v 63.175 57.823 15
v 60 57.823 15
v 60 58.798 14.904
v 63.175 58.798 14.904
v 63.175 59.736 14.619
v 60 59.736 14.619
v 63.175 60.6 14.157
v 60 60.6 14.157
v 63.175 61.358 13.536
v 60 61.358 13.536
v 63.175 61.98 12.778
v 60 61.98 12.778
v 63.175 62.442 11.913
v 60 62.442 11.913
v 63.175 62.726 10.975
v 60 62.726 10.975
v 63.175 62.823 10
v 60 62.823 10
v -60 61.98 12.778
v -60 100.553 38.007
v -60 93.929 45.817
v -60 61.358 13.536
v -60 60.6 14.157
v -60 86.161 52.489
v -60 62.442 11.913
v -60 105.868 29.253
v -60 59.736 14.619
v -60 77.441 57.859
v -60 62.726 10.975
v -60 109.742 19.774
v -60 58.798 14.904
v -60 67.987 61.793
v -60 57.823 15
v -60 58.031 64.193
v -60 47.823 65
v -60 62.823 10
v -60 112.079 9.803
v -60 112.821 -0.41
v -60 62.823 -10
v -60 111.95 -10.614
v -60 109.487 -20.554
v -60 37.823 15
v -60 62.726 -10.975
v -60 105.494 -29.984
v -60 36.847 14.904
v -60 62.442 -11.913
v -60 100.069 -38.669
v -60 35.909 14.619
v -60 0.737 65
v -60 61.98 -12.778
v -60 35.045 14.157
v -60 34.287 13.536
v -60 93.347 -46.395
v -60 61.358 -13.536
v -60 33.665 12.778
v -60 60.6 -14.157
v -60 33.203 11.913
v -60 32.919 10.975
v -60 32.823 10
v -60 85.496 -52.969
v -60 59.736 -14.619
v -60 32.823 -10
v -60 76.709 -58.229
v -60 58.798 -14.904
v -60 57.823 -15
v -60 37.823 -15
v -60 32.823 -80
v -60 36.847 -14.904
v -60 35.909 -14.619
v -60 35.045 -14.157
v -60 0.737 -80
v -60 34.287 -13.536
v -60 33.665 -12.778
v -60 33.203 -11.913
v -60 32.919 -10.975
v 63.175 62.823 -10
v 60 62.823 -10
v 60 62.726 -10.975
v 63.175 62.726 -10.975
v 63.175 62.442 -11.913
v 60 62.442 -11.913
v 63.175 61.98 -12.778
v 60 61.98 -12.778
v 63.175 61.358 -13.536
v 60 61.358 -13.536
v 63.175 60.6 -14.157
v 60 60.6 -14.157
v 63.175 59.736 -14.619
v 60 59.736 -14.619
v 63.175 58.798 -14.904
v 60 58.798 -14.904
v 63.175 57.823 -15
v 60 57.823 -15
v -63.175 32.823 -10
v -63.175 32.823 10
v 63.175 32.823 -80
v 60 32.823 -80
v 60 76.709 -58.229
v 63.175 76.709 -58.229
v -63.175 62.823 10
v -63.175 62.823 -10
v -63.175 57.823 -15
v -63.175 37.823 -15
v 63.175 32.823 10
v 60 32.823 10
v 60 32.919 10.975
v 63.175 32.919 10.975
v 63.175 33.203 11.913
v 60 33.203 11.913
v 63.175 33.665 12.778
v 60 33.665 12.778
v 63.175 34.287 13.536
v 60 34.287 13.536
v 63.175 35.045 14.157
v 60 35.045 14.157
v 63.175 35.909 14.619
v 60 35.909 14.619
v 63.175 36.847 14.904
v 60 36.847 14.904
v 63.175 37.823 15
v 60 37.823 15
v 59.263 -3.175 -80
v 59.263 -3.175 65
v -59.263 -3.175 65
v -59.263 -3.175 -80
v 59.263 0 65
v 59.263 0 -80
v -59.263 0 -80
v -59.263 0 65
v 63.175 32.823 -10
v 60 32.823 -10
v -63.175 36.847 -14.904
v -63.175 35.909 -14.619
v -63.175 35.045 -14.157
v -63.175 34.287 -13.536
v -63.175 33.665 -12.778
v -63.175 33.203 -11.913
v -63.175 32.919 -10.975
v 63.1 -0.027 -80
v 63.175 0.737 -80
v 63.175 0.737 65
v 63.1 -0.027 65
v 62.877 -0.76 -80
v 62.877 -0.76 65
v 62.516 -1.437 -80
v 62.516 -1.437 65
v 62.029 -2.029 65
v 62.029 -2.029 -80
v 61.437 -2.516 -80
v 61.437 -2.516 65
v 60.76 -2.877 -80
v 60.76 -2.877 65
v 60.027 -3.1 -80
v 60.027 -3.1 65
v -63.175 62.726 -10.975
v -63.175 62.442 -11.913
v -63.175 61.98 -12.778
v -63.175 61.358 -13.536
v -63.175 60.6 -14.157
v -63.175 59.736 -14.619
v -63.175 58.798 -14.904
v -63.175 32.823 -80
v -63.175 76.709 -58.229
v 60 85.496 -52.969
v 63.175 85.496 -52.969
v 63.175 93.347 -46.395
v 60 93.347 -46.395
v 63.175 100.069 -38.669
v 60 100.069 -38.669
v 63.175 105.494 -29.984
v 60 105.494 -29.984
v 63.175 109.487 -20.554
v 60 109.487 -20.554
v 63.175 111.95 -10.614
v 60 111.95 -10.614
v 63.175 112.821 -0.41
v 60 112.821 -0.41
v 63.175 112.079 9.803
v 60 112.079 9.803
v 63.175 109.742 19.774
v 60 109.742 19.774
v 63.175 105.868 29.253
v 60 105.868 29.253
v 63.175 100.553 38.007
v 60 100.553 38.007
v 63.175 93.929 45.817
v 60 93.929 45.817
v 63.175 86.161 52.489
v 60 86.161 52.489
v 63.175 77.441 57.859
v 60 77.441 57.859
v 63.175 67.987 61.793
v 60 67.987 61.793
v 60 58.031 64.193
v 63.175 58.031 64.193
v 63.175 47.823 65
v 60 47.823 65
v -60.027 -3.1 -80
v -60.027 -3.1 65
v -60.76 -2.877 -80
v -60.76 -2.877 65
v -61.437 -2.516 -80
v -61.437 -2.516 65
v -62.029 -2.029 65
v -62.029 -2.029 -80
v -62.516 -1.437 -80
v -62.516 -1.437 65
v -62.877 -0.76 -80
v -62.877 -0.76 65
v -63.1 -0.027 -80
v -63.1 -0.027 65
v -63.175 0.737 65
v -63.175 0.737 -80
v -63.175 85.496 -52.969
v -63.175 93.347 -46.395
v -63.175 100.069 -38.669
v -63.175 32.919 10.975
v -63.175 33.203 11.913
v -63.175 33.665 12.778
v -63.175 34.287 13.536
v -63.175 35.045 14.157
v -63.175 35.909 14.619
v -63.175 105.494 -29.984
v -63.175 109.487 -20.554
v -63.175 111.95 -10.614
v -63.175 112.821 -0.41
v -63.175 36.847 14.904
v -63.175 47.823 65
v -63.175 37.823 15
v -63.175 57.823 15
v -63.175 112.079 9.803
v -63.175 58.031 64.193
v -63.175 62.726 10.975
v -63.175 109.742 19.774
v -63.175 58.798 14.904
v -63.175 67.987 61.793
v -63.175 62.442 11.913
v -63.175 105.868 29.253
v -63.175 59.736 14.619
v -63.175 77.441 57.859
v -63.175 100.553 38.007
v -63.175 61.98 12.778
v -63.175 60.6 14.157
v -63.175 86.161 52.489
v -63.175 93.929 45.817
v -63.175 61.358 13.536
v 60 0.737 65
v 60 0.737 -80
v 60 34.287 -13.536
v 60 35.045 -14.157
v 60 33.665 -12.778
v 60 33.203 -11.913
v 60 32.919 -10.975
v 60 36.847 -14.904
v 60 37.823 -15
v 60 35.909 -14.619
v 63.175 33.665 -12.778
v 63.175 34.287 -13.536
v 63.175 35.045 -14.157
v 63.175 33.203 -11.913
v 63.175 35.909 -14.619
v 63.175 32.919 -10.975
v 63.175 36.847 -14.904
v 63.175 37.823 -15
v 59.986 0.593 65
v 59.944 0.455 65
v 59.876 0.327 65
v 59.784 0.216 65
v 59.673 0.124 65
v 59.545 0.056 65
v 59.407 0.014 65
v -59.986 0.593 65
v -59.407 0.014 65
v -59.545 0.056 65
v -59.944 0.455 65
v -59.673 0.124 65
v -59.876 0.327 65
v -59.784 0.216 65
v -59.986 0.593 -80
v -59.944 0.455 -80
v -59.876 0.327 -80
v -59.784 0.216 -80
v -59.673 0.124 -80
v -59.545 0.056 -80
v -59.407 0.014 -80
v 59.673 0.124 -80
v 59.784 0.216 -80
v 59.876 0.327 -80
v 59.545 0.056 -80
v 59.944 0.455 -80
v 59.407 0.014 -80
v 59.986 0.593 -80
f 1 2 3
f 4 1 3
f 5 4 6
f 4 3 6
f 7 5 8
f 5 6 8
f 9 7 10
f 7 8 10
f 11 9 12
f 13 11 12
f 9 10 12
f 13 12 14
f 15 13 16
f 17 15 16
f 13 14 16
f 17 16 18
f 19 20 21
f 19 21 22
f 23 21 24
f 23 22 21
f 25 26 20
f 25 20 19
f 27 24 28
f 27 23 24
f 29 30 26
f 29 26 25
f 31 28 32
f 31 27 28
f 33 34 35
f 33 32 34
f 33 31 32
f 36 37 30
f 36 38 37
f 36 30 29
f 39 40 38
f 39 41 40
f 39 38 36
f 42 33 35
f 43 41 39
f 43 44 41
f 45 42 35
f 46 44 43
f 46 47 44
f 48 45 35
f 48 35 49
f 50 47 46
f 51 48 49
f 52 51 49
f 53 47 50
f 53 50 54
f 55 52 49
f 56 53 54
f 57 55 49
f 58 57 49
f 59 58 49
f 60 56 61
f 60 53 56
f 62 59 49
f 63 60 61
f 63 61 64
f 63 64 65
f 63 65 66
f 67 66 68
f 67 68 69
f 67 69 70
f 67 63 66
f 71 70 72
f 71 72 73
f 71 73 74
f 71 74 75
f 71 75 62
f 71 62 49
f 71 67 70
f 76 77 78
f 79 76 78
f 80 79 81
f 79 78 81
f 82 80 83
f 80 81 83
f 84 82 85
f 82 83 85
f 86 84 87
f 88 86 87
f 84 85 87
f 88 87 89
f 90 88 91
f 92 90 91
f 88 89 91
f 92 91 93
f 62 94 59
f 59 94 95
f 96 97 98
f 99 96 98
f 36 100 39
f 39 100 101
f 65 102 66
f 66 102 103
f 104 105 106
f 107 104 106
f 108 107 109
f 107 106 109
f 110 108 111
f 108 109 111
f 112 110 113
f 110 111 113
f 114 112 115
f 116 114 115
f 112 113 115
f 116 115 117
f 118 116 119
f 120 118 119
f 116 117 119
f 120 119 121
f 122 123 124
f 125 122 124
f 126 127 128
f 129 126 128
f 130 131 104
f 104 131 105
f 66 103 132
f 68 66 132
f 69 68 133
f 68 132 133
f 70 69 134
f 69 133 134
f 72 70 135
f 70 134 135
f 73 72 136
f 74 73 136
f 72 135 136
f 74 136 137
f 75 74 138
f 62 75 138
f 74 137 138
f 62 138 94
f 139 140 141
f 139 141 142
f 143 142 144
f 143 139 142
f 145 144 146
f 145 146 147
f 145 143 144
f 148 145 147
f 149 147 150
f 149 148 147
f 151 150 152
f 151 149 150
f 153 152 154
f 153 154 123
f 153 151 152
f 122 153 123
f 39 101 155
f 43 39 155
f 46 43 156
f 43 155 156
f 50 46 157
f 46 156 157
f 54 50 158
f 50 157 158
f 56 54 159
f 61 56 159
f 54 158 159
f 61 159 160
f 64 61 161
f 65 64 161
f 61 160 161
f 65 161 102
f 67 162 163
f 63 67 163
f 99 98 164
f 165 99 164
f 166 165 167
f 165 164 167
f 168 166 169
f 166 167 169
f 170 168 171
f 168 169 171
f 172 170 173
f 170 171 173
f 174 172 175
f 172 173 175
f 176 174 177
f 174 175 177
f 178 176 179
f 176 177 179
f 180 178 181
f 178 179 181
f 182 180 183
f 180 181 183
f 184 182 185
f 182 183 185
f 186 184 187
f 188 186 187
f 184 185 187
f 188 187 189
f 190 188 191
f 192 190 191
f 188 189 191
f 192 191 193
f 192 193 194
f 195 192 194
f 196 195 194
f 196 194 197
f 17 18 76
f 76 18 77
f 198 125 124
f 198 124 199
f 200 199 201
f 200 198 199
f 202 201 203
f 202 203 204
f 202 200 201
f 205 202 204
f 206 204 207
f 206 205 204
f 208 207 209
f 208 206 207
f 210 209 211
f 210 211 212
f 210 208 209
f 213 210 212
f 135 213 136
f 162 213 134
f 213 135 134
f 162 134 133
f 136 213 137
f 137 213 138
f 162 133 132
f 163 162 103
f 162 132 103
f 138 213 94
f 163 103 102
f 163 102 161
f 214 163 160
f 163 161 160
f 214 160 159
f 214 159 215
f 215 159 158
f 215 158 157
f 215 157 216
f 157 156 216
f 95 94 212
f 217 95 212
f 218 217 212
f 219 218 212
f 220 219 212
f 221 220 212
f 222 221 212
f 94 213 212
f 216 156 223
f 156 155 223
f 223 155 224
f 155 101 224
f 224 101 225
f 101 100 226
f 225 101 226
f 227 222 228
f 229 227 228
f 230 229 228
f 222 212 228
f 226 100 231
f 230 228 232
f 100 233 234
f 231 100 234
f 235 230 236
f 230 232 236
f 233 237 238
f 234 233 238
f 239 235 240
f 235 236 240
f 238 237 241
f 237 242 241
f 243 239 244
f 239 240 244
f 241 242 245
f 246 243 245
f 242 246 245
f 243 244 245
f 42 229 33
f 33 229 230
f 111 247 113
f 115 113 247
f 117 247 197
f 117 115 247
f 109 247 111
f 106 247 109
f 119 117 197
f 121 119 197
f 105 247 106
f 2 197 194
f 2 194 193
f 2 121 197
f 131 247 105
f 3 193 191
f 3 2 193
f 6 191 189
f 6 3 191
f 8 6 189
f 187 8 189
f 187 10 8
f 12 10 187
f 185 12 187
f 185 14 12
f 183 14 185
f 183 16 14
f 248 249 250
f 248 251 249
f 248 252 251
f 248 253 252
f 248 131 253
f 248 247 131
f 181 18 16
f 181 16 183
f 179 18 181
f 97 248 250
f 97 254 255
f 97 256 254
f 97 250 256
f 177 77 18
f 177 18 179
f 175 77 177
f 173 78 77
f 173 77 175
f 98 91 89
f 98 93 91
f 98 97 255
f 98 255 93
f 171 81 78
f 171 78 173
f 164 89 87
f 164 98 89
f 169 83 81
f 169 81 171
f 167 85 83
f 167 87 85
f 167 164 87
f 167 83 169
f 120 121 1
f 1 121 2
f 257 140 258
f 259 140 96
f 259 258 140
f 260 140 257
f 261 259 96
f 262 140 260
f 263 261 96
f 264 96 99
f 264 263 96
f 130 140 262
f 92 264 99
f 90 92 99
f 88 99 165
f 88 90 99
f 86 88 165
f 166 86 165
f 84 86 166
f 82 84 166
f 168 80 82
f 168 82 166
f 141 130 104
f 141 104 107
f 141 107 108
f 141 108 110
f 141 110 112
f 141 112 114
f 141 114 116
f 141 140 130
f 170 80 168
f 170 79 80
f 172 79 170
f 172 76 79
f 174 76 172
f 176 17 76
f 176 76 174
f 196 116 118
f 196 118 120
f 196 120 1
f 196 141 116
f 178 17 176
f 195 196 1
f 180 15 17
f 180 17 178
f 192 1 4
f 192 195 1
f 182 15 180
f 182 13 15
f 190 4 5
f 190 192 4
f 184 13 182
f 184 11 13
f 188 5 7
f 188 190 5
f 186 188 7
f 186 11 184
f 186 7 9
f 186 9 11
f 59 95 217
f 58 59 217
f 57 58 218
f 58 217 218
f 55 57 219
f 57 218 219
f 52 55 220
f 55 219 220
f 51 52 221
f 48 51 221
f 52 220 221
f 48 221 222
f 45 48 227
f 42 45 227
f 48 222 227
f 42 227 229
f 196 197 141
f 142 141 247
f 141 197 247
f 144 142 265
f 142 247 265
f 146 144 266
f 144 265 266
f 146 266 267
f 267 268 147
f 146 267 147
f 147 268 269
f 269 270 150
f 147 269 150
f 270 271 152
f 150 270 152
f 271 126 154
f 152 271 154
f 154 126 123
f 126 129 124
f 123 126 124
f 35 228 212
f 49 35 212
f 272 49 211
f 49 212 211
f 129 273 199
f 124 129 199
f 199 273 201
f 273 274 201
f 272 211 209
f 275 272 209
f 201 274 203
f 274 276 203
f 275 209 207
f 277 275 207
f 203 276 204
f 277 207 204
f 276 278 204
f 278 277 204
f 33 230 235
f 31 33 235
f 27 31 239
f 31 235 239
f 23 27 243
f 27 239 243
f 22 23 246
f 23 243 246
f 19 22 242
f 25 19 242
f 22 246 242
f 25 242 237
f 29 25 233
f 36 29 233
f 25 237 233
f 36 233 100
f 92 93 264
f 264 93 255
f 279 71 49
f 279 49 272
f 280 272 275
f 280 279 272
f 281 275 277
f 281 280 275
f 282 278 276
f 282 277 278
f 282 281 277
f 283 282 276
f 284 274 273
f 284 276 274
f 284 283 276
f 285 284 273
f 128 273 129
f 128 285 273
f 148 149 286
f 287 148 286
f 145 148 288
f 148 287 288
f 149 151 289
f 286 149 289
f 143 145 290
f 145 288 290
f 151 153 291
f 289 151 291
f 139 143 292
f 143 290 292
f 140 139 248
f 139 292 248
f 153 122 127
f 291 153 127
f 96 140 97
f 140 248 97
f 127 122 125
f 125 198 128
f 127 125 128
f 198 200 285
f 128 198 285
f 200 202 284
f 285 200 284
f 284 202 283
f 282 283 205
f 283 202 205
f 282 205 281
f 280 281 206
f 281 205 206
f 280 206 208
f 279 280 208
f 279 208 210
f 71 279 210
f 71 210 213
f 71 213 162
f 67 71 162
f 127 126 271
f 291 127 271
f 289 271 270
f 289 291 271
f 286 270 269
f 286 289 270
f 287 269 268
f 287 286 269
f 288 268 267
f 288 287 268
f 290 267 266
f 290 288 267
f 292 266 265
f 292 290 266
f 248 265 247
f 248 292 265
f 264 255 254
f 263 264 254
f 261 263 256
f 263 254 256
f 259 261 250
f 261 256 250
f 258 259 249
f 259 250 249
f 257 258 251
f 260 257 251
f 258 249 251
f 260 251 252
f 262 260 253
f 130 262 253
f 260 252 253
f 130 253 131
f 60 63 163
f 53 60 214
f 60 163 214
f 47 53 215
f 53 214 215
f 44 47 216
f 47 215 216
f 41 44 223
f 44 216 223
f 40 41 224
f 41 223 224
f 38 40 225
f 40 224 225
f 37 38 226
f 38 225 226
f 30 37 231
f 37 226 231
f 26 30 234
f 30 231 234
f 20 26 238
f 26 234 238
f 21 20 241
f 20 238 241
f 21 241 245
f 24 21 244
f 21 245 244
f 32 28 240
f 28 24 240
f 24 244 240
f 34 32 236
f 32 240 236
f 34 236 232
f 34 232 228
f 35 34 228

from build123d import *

# Parameters (mm, degrees)
BASE_FLANGE2_DEPTH         = 3.175
SKETCHED_START             = -176
SKETCHED_BEND3_OUTLINE_W   = 3.175
SKETCHED_BEND3_OUTLINE_H   = 145
SKETCHED_BEND3_DEPTH       = 112.825
SKETCHED_START_2           = 63.175
SKETCHED_BEND3_2_OUTLINE_W = 3.175
SKETCHED_BEND3_2_OUTLINE_H = 145
SKETCHED_BEND3_2_DEPTH     = 112.825
SKETCHED_START_3           = -62.794557784
SKETCHED_BEND3_3_DEPTH     = 2.794557784
SKETCHED_START_4           = 60
SKETCHED_BEND3_4_DEPTH     = 2.794557784
SKETCHED_START_5           = -63.175
SKETCHED_BEND3_5_DEPTH     = 3.9116
SKETCHED_START_6           = 59.2634
SKETCHED_BEND3_6_DEPTH     = 3.9116
SKETCHED_START_7           = -81
SKETCHED_BEND3_7_DEPTH     = 147


with BuildPart() as part:
    # Base-Flange2: sheet metal written as solids
    # Sketch1 → Base-Flange2 (new body)
    with BuildSketch(Plane(origin=(0, 0, 0), x_dir=(1, 0, 0), z_dir=(0, 1, 0))):
        with BuildLine():
            Line((-95, 80), (95, 80))
            Line((95, 80), (138.886329547, 58.22868679))
            ThreePointArc((138.886329547, 58.22868679), (173.284534609, -14.834678268), (110, -65))
            Line((110, -65), (-110, -65))
            ThreePointArc((-110, -65), (-173.284534609, -14.834678268), (-138.886329547, 58.22868679))
            Line((-138.886329547, 58.22868679), (-95, 80))
        make_face()
        with BuildLine():
            Line((100, -15), (120, -15))
            ThreePointArc((120, -15), (123.535533906, -13.535533906), (125, -10))
            Line((125, -10), (125, 10))
            ThreePointArc((125, 10), (123.535533906, 13.535533906), (120, 15))
            Line((120, 15), (100, 15))
            ThreePointArc((100, 15), (96.464466094, 13.535533906), (95, 10))
            Line((95, 10), (95, -10))
            ThreePointArc((95, -10), (96.464466094, -13.535533906), (100, -15))
        make_face(mode=Mode.SUBTRACT)
        with BuildLine():
            Line((-100, -15), (-120, -15))
            ThreePointArc((-120, -15), (-123.535533906, -13.535533906), (-125, -10))
            Line((-125, -10), (-125, 10))
            ThreePointArc((-125, 10), (-123.535533906, 13.535533906), (-120, 15))
            Line((-120, 15), (-100, 15))
            ThreePointArc((-100, 15), (-96.464466094, 13.535533906), (-95, 10))
            Line((-95, 10), (-95, -10))
            ThreePointArc((-95, -10), (-96.464466094, -13.535533906), (-100, -15))
        make_face(mode=Mode.SUBTRACT)
    extrude(amount=-BASE_FLANGE2_DEPTH)

    # Sketched Bend3: read off the stored shape, not the designer's step
    # Sketched Bend3 outline → Sketched Bend3 (cut)
    with BuildSketch(Plane.YZ.offset(SKETCHED_START)):
        with Locations((-1.5875, -7.5)):
            Rectangle(SKETCHED_BEND3_OUTLINE_W, SKETCHED_BEND3_OUTLINE_H)
    extrude(amount=SKETCHED_BEND3_DEPTH, mode=Mode.SUBTRACT)

    # Sketched Bend3 2 outline → Sketched Bend3 2 (cut)
    with BuildSketch(Plane.YZ.offset(SKETCHED_START_2)):
        with Locations((-1.5875, -7.5)):
            Rectangle(SKETCHED_BEND3_2_OUTLINE_W, SKETCHED_BEND3_2_OUTLINE_H)
    extrude(amount=SKETCHED_BEND3_2_DEPTH, mode=Mode.SUBTRACT)

    # Sketched Bend3 3 outline → Sketched Bend3 3 (add)
    with BuildSketch(Plane.YZ.offset(SKETCHED_START_3)):
        with BuildLine():
            Line((47.822512257, 65), (0, 65))
            Line((0, 65), (0, -80))
            Line((0, -80), (32.822512257, -80))
            Line((32.822512257, -80), (76.708841804, -58.22868679))
            ThreePointArc((76.708841804, -58.22868679), (111.107046866, 14.834678268), (47.822512257, 65))
        make_face()
        with BuildLine():
            ThreePointArc((62.822512257, -10), (61.358046163, -13.535533906), (57.822512257, -15))
            Line((57.822512257, -15), (37.822512257, -15))
            ThreePointArc((37.822512257, -15), (34.286978351, -13.535533906), (32.822512257, -10))
            Line((32.822512257, -10), (32.822512257, 10))
            ThreePointArc((32.822512257, 10), (34.286978351, 13.535533906), (37.822512257, 15))
            Line((37.822512257, 15), (57.822512257, 15))
            ThreePointArc((57.822512257, 15), (61.358046163, 13.535533906), (62.822512257, 10))
            Line((62.822512257, 10), (62.822512257, -10))
        make_face(mode=Mode.SUBTRACT)
    extrude(amount=SKETCHED_BEND3_3_DEPTH)

    # Sketched Bend3 4 outline → Sketched Bend3 4 (add)
    with BuildSketch(Plane.YZ.offset(SKETCHED_START_4)):
        with BuildLine():
            Line((47.822512257, 65), (0, 65))
            Line((0, 65), (0, -80))
            Line((0, -80), (32.822512257, -80))
            Line((32.822512257, -80), (76.708841804, -58.22868679))
            ThreePointArc((76.708841804, -58.22868679), (111.107046866, 14.834678268), (47.822512257, 65))
        make_face()
        with BuildLine():
            ThreePointArc((62.822512257, -10), (61.358046163, -13.535533906), (57.822512257, -15))
            Line((57.822512257, -15), (37.822512257, -15))
            ThreePointArc((37.822512257, -15), (34.286978351, -13.535533906), (32.822512257, -10))
            Line((32.822512257, -10), (32.822512257, 10))
            ThreePointArc((32.822512257, 10), (34.286978351, 13.535533906), (37.822512257, 15))
            Line((37.822512257, 15), (57.822512257, 15))
            ThreePointArc((57.822512257, 15), (61.358046163, 13.535533906), (62.822512257, 10))
            Line((62.822512257, 10), (62.822512257, -10))
        make_face(mode=Mode.SUBTRACT)
    extrude(amount=SKETCHED_BEND3_4_DEPTH)

    # Sketched Bend3 5 outline → Sketched Bend3 5 (add)
    with BuildSketch(Plane.YZ.offset(SKETCHED_START_5)):
        with BuildLine():
            ThreePointArc((76.708841804, -58.22868679), (111.107046866, 14.834678268), (47.822512257, 65))
            Line((47.822512257, 65), (0, 65))
            Line((0, 65), (0, -80))
            Line((0, -80), (32.822512257, -80))
            Line((32.822512257, -80), (76.708841804, -58.22868679))
        make_face()
        with BuildLine():
            ThreePointArc((62.822512257, -10), (61.358046163, -13.535533906), (57.822512257, -15))
            Line((57.822512257, -15), (37.822512257, -15))
            ThreePointArc((37.822512257, -15), (34.286978351, -13.535533906), (32.822512257, -10))
            Line((32.822512257, -10), (32.822512257, 10))
            ThreePointArc((32.822512257, 10), (34.286978351, 13.535533906), (37.822512257, 15))
            Line((37.822512257, 15), (57.822512257, 15))
            ThreePointArc((57.822512257, 15), (61.358046163, 13.535533906), (62.822512257, 10))
            Line((62.822512257, 10), (62.822512257, -10))
        make_face(mode=Mode.SUBTRACT)
    extrude(amount=SKETCHED_BEND3_5_DEPTH)

    # Sketched Bend3 6 outline → Sketched Bend3 6 (add)
    with BuildSketch(Plane.YZ.offset(SKETCHED_START_6)):
        with BuildLine():
            ThreePointArc((76.708841804, -58.22868679), (111.107046866, 14.834678268), (47.822512257, 65))
            Line((47.822512257, 65), (0, 65))
            Line((0, 65), (0, -80))
            Line((0, -80), (32.822512257, -80))
            Line((32.822512257, -80), (76.708841804, -58.22868679))
        make_face()
        with BuildLine():
            ThreePointArc((62.822512257, -10), (61.358046163, -13.535533906), (57.822512257, -15))
            Line((57.822512257, -15), (37.822512257, -15))
            ThreePointArc((37.822512257, -15), (34.286978351, -13.535533906), (32.822512257, -10))
            Line((32.822512257, -10), (32.822512257, 10))
            ThreePointArc((32.822512257, 10), (34.286978351, 13.535533906), (37.822512257, 15))
            Line((37.822512257, 15), (57.822512257, 15))
            ThreePointArc((57.822512257, 15), (61.358046163, 13.535533906), (62.822512257, 10))
            Line((62.822512257, 10), (62.822512257, -10))
        make_face(mode=Mode.SUBTRACT)
    extrude(amount=SKETCHED_BEND3_6_DEPTH)

    # Sketched Bend3 7 outline → Sketched Bend3 7 (cut)
    with BuildSketch(Plane.XY.offset(SKETCHED_START_7)):
        with BuildLine():
            Line((-65, -3.175000031), (-59.2634, -3.175))
            ThreePointArc((-59.2634, -3.175), (-62.029318885, -2.029318885), (-63.175, 0.7366))
            Line((-63.175, 0.7366), (-63.175000008, 32.822512257))
            Line((-63.175000008, 32.822512257), (-65, 32.822512257))
            Line((-65, 32.822512257), (-65, -3.175000031))
        make_face()
        with BuildLine():
            ThreePointArc((63.175, 0.7366), (62.029318885, -2.029318885), (59.2634, -3.175))
            Line((59.2634, -3.175), (65, -3.175000031))
            Line((65, -3.175000031), (65, 32.822512257))
            Line((65, 32.822512257), (63.175, 32.822512257))
            Line((63.175, 32.822512257), (63.175, 0.7366))
        make_face()
        with BuildLine():
            Line((-59.2634, 0), (-59.2634, 114))
            Line((-59.2634, 114), (-60, 114))
            Line((-60, 114), (-60, 0.7366))
            ThreePointArc((-60, 0.7366), (-59.784254855, 0.215745145), (-59.2634, 0))
        make_face()
        with BuildLine():
            ThreePointArc((59.2634, 0), (59.784254855, 0.215745145), (60, 0.7366))
            Line((60, 0.7366), (60, 114))
            Line((60, 114), (59.2634, 114))
            Line((59.2634, 114), (59.2634, 0))
        make_face()
    extrude(amount=SKETCHED_BEND3_7_DEPTH, mode=Mode.SUBTRACT)


solid = part.part
